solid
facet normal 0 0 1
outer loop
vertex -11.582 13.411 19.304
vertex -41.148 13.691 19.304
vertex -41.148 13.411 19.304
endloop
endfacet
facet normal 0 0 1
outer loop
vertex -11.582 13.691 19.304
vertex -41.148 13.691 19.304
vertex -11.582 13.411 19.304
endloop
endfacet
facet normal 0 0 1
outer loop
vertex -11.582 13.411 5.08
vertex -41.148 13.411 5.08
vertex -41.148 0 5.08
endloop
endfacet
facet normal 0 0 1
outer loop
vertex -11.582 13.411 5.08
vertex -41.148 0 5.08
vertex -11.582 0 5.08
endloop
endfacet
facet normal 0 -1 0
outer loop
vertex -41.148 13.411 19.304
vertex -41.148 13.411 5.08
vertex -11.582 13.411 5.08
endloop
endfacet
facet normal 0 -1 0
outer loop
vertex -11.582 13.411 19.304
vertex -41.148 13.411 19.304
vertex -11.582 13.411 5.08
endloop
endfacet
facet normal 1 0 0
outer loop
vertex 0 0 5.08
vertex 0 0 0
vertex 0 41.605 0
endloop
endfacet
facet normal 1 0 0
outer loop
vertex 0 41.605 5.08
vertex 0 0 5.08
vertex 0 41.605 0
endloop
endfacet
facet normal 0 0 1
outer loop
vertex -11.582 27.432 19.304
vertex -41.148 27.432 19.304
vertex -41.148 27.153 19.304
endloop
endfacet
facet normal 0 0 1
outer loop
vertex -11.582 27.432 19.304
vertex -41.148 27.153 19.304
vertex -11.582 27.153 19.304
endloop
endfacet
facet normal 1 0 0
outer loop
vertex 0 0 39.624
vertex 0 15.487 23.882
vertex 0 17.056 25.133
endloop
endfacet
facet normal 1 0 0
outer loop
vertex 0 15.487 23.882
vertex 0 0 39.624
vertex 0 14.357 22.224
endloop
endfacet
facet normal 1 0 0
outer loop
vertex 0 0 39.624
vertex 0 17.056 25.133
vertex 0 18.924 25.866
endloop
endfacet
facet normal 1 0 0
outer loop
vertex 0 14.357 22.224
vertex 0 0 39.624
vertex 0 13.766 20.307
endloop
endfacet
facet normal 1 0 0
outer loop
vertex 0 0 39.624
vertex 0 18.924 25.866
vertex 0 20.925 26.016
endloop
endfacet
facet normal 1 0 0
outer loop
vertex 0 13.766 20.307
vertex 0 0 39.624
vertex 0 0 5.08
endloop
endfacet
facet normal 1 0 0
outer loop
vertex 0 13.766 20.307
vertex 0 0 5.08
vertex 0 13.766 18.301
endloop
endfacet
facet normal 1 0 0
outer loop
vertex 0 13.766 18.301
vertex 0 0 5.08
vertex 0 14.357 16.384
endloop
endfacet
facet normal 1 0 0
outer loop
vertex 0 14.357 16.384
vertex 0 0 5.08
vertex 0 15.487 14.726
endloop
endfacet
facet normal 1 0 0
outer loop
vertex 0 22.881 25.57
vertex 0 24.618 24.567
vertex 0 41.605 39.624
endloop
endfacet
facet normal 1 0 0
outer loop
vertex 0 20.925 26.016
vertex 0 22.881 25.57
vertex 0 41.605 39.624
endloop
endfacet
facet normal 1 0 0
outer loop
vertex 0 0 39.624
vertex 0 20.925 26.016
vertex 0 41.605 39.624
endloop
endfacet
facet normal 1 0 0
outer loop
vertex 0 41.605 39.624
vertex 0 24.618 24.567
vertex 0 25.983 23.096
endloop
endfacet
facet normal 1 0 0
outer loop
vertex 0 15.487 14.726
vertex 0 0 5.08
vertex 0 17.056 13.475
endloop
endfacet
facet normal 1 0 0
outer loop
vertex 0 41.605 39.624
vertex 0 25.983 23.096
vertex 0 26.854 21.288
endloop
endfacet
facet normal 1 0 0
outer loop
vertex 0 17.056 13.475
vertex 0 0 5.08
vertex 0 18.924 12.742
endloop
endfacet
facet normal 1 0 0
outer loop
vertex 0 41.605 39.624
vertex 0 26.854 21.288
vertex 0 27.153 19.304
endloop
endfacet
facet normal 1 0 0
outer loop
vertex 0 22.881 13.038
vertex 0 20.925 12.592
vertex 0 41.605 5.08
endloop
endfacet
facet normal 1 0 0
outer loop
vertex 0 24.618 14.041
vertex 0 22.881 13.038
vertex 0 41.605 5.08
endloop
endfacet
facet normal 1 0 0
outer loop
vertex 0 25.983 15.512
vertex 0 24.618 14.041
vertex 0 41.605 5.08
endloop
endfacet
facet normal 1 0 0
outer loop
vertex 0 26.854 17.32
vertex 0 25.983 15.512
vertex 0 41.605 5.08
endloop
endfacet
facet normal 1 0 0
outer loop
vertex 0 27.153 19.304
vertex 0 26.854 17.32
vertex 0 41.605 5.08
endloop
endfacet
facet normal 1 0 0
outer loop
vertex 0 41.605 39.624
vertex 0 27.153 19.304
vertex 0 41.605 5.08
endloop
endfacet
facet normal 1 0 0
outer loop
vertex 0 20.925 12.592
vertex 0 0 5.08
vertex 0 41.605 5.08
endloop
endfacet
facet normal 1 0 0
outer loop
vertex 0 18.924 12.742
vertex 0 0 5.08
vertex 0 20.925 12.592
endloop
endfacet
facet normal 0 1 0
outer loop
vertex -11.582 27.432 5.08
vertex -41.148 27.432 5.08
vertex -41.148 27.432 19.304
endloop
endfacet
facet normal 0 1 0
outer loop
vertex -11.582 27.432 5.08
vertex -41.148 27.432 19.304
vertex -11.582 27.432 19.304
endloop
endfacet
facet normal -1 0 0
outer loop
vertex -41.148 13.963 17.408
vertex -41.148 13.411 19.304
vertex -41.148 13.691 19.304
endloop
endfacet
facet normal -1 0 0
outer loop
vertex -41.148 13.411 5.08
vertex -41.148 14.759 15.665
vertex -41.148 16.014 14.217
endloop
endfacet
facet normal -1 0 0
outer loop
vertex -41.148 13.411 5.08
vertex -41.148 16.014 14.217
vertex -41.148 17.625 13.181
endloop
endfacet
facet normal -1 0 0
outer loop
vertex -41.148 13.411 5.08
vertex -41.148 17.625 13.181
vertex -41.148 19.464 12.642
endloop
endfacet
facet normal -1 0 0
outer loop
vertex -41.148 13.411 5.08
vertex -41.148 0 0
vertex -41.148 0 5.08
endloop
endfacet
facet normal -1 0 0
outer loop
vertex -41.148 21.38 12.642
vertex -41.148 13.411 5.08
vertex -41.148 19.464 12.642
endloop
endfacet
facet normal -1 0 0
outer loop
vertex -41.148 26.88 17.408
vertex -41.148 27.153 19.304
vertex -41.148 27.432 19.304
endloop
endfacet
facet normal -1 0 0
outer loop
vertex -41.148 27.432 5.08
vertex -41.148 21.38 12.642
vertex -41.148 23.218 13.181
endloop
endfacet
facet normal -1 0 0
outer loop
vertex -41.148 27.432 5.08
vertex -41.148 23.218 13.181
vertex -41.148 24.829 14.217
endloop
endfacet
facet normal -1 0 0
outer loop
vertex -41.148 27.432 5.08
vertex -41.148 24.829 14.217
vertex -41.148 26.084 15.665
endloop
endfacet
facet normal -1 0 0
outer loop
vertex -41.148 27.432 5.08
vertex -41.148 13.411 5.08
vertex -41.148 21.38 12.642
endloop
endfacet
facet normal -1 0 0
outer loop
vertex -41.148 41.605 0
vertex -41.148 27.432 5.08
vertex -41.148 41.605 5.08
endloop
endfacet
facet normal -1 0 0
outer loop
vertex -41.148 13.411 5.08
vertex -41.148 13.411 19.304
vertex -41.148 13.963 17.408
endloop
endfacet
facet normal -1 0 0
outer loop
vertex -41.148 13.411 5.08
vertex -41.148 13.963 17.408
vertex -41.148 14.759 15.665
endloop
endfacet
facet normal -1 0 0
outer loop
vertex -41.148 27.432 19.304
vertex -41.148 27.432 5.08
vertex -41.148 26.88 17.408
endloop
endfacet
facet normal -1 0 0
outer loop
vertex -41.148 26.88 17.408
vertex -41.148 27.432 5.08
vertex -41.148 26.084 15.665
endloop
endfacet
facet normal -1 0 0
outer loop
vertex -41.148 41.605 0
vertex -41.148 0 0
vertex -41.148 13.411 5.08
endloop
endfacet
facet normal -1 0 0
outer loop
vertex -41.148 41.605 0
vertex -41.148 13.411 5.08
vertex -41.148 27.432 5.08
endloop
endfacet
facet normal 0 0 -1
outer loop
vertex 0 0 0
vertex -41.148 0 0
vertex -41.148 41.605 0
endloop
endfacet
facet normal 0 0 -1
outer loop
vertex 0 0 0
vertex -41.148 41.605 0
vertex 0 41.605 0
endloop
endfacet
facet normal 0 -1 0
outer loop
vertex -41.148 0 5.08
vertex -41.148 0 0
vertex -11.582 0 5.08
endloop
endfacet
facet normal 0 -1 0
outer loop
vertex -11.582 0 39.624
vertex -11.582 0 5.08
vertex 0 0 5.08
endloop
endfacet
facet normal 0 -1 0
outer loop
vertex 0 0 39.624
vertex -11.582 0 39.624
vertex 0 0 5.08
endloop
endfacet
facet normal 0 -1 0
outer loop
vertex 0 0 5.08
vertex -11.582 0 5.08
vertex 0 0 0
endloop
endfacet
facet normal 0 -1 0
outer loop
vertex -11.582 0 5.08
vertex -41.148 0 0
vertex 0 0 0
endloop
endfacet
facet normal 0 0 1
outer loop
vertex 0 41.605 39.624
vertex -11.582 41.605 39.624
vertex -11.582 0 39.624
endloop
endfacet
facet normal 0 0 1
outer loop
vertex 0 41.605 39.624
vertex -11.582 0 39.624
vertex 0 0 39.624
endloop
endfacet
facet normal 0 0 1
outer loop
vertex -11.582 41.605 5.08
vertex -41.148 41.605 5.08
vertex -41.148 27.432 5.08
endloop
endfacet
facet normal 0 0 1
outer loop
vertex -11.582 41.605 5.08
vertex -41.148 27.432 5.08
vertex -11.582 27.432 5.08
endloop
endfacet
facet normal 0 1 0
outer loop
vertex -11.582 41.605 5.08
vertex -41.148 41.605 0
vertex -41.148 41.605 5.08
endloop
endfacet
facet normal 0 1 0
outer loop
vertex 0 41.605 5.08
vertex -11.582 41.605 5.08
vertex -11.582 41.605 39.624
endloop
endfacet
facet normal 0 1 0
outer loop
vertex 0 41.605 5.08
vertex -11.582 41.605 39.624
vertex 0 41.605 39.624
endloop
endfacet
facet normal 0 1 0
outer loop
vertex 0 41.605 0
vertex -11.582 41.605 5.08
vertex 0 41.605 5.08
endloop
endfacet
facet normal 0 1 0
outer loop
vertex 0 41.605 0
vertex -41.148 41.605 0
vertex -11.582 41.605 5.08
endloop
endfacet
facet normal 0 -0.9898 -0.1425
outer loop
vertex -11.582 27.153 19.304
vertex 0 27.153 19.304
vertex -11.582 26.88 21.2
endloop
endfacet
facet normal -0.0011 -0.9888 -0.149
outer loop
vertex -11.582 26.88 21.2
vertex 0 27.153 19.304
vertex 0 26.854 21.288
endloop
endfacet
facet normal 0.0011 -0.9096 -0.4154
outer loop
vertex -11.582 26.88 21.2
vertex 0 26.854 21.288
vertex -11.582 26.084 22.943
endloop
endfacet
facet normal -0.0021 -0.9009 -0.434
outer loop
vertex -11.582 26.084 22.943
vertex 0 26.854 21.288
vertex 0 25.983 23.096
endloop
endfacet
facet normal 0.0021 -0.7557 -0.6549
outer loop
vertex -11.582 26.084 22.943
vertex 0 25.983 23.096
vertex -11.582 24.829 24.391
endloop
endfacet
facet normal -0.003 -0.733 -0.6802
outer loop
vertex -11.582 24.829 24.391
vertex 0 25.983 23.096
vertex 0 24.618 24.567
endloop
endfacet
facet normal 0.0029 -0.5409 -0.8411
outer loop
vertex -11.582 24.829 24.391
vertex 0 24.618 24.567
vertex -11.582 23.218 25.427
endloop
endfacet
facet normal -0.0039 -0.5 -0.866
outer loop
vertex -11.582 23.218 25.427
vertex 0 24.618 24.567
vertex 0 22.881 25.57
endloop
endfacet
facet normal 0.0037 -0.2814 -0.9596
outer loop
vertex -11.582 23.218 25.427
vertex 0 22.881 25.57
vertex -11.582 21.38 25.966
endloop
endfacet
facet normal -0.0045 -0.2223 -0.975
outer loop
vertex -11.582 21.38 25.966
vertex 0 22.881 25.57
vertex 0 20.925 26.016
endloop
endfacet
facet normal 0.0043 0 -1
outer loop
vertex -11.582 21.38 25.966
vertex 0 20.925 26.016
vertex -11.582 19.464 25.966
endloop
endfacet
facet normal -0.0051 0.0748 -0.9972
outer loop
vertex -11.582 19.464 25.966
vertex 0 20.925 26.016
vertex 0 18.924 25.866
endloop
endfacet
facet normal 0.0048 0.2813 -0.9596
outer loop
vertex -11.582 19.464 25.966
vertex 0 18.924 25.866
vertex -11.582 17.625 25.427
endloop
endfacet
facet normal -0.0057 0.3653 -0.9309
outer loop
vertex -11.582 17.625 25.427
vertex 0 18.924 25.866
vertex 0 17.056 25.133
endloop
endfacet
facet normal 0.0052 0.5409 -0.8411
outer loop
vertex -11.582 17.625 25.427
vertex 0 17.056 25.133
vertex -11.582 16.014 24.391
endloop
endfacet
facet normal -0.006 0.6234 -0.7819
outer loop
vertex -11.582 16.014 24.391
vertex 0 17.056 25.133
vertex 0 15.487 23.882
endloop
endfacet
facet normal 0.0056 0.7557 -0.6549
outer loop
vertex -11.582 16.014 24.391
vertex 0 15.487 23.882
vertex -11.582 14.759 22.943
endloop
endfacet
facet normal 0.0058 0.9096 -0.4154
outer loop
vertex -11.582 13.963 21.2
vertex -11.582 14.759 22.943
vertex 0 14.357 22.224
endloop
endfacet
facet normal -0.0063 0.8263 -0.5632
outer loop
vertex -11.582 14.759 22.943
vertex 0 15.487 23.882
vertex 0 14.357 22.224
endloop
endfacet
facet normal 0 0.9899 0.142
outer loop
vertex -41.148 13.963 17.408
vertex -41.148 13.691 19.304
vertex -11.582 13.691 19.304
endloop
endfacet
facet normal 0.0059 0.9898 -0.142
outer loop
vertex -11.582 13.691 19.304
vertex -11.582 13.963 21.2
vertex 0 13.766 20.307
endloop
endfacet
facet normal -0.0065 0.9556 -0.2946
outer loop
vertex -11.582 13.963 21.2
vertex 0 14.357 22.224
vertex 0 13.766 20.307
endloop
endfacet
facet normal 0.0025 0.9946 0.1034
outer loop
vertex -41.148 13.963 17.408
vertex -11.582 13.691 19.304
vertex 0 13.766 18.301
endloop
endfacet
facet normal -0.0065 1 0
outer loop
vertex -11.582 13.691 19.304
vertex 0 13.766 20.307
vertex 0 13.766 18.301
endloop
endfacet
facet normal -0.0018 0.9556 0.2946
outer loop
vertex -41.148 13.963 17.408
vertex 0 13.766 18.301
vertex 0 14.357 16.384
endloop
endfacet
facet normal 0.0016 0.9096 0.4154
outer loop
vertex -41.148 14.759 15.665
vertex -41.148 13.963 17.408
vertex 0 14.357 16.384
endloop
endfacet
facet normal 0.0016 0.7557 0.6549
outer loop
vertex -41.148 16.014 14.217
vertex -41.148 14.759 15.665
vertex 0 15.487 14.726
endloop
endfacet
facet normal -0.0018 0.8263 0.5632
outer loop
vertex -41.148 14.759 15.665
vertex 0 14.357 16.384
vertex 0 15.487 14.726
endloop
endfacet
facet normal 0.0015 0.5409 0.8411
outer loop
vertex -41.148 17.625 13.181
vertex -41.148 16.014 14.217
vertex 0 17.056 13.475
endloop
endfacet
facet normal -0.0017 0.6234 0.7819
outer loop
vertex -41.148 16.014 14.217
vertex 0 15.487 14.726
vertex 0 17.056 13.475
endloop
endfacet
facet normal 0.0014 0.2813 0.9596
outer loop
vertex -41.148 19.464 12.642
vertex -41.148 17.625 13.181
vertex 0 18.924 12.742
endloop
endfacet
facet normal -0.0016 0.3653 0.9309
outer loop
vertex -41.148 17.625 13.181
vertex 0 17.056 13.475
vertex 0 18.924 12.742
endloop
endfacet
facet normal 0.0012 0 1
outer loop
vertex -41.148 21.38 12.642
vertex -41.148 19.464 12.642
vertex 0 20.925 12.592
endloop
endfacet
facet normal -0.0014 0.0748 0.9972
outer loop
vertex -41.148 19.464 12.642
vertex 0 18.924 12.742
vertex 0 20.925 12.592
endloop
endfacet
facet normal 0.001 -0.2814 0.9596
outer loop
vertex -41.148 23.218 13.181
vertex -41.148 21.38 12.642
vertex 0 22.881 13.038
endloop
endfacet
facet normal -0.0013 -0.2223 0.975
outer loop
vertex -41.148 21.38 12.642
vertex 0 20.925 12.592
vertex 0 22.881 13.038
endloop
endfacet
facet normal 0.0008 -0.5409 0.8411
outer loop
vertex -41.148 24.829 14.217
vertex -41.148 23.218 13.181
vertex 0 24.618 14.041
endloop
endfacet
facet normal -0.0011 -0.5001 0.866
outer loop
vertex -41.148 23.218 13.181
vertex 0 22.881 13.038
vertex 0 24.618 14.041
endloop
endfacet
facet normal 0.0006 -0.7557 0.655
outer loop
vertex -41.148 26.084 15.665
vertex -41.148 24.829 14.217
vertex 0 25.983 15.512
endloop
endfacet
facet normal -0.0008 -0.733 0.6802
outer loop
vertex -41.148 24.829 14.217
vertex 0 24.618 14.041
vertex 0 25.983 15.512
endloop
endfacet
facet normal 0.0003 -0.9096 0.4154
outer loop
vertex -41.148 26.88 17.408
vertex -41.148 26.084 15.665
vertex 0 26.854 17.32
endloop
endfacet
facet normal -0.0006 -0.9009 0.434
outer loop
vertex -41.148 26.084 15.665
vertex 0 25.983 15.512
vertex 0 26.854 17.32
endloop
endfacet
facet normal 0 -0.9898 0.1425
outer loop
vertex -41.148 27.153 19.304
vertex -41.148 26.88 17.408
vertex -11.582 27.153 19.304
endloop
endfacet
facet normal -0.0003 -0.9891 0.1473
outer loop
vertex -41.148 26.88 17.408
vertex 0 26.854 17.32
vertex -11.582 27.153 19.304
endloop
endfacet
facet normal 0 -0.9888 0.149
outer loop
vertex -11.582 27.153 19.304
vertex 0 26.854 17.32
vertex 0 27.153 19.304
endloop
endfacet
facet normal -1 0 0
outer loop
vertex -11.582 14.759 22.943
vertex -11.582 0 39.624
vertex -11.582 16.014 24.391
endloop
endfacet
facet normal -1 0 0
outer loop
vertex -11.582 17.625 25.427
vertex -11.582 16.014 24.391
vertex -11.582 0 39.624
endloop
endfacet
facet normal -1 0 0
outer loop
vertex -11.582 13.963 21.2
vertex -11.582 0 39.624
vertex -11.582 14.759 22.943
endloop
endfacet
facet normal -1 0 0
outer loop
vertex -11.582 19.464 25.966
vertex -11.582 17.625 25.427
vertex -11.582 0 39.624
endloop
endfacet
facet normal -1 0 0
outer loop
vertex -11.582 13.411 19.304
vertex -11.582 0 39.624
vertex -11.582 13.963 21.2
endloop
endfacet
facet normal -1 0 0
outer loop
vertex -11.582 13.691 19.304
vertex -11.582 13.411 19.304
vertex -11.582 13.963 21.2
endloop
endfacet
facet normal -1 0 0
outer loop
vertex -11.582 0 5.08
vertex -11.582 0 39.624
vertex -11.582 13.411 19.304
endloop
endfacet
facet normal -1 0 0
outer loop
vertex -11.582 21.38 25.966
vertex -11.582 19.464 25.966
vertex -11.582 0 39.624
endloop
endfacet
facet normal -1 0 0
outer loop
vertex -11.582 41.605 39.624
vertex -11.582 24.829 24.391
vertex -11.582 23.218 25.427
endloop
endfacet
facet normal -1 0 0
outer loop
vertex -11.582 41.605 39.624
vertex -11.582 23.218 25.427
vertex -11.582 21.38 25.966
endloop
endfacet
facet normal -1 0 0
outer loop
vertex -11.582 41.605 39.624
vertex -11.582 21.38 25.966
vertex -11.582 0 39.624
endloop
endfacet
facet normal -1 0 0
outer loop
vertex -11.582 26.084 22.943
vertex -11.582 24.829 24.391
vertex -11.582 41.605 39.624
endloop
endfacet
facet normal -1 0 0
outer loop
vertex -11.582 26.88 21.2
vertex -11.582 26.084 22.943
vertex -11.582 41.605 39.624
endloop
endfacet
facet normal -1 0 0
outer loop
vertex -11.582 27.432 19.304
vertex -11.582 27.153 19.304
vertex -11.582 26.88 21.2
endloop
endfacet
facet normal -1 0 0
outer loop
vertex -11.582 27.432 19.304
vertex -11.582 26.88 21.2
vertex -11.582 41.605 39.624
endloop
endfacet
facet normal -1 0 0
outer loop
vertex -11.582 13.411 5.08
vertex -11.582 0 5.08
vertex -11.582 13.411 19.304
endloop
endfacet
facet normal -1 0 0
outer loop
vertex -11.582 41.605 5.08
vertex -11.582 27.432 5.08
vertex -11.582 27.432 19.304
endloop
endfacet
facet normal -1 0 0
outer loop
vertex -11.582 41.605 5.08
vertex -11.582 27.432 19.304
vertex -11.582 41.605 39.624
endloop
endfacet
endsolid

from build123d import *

# Parameters (mm, degrees)
F0_W     = 41.147999
F0_H     = 41.605201
F1_DEPTH = 5.08
F2_W     = 11.5824
F2_H     = 41.605201
F3_DEPTH = 34.544
F4_W     = 29.565599
F4_H     = 14.0208
F5_DEPTH = 14.224
F7_D     = 13.462


with BuildPart() as f1:
    # F0 (on Top) → F1 (new body)
    with BuildSketch(Plane.XY):
        with Locations((-20.573999, 20.802601)):
            Rectangle(F0_W, F0_H)
    extrude(amount=F1_DEPTH)

    # F2 (on face) → F3 (join)
    with BuildSketch(Plane.XY.offset(5.08)):
        with Locations((-5.7912, 20.802601)):
            Rectangle(F2_W, F2_H)
    extrude(amount=F3_DEPTH)

    # F4 (on face) → F5 (join)
    with BuildSketch(Plane.XY.offset(5.08)):
        with Locations((-26.365199, 20.4216)):
            Rectangle(F4_W, F4_H)
    extrude(amount=F5_DEPTH)

    # F7 (through all)
    with Locations(Plane(origin=(-41.147999, 0, 0), x_dir=(0, -1, 0), z_dir=(-1, 0, 0))):
        with Locations((-20.4216, 19.304)):
            Hole(F7_D / 2)


solid = f1.part
